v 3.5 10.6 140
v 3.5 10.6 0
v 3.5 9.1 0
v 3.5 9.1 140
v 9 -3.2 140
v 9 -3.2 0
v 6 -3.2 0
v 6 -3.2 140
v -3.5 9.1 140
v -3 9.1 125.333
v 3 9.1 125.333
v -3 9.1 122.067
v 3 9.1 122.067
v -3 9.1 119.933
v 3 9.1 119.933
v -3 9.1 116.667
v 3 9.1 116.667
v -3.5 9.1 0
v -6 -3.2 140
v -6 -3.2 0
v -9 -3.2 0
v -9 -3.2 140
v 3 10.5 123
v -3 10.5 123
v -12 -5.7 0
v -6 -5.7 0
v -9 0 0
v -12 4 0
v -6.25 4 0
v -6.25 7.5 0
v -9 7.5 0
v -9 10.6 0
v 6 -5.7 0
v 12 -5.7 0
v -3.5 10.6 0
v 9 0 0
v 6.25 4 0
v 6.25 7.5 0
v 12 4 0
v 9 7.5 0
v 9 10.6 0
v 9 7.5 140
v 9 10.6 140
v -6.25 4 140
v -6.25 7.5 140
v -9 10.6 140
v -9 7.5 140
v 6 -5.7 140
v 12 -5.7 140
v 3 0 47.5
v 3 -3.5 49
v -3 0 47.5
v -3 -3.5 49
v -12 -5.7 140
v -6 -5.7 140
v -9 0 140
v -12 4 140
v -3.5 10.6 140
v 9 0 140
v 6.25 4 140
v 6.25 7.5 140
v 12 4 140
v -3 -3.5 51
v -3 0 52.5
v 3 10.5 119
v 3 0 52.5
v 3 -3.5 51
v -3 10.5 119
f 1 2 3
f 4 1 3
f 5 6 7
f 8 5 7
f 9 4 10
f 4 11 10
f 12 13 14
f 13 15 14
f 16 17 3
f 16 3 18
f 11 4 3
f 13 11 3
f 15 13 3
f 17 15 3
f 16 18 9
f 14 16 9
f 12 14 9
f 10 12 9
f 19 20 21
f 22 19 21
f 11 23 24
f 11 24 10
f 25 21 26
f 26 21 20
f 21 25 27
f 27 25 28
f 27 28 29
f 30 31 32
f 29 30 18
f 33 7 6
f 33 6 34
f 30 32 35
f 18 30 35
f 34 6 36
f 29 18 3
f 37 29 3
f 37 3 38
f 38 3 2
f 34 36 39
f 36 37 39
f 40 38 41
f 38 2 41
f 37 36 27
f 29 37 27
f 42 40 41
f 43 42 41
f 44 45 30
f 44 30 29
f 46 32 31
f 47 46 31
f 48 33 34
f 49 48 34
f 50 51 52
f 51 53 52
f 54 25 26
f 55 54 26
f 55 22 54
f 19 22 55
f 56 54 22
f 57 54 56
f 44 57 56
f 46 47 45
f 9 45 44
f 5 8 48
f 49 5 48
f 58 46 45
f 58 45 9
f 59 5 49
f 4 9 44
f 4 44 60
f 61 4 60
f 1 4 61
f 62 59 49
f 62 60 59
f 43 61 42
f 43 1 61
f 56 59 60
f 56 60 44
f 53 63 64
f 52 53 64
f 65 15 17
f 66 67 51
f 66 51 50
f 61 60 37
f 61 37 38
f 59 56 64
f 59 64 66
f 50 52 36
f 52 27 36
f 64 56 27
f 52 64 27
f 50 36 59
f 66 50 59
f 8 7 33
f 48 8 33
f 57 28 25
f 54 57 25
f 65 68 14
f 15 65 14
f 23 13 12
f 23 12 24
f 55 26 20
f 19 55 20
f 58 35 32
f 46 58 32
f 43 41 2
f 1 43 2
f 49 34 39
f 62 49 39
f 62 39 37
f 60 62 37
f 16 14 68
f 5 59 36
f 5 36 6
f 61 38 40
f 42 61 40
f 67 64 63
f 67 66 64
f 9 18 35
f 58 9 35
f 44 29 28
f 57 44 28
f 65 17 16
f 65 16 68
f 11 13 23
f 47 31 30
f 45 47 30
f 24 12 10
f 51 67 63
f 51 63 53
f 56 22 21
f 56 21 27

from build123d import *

# Parameters (mm, degrees)
F1_DEPTH      = 140
F3_DEPTH      = 3
F3_DEPTH_BACK = 3
F5_DEPTH      = 3
F5_DEPTH_BACK = 3


with BuildPart() as f1:
    # F0 (on Top) → F1 (new body)
    with BuildSketch(Plane.XY):
        Polygon((-9, 0), (0, 0), (9, 0), (9, -3.2), (6, -3.2), (6, -5.7), (12, -5.7), (12, 4), (6.25, 4), (6.25, 7.5), (9, 7.5), (9, 10.6), (3.5, 10.6), (3.5, 9.1), (0, 9.1), (-3.5, 9.1), (-3.5, 10.6), (-9, 10.6), (-9, 7.5), (-6.25, 7.5), (-6.25, 4), (-12, 4), (-12, -5.7), (-6, -5.7), (-6, -3.2), (-9, -3.2), align=None)
    extrude(amount=F1_DEPTH)

    # F2 (on Right) → F3 (join, two sides)
    with BuildSketch(Plane.YZ) as f3_sk:
        Polygon((0, 52.5), (-3.5, 51), (-3.5, 49), (0, 47.5), align=None)
    extrude(amount=F3_DEPTH)
    extrude(f3_sk.sketch, amount=-F3_DEPTH_BACK)

    # F4 (on Right) → F5 (join, two sides)
    with BuildSketch(Plane.YZ) as f5_sk:
        Polygon((7.5, 128), (7.5, 114), (10.5, 119), (9, 120), (9, 122), (10.5, 123), align=None)
    extrude(amount=F5_DEPTH)
    extrude(f5_sk.sketch, amount=-F5_DEPTH_BACK)


solid = f1.part
